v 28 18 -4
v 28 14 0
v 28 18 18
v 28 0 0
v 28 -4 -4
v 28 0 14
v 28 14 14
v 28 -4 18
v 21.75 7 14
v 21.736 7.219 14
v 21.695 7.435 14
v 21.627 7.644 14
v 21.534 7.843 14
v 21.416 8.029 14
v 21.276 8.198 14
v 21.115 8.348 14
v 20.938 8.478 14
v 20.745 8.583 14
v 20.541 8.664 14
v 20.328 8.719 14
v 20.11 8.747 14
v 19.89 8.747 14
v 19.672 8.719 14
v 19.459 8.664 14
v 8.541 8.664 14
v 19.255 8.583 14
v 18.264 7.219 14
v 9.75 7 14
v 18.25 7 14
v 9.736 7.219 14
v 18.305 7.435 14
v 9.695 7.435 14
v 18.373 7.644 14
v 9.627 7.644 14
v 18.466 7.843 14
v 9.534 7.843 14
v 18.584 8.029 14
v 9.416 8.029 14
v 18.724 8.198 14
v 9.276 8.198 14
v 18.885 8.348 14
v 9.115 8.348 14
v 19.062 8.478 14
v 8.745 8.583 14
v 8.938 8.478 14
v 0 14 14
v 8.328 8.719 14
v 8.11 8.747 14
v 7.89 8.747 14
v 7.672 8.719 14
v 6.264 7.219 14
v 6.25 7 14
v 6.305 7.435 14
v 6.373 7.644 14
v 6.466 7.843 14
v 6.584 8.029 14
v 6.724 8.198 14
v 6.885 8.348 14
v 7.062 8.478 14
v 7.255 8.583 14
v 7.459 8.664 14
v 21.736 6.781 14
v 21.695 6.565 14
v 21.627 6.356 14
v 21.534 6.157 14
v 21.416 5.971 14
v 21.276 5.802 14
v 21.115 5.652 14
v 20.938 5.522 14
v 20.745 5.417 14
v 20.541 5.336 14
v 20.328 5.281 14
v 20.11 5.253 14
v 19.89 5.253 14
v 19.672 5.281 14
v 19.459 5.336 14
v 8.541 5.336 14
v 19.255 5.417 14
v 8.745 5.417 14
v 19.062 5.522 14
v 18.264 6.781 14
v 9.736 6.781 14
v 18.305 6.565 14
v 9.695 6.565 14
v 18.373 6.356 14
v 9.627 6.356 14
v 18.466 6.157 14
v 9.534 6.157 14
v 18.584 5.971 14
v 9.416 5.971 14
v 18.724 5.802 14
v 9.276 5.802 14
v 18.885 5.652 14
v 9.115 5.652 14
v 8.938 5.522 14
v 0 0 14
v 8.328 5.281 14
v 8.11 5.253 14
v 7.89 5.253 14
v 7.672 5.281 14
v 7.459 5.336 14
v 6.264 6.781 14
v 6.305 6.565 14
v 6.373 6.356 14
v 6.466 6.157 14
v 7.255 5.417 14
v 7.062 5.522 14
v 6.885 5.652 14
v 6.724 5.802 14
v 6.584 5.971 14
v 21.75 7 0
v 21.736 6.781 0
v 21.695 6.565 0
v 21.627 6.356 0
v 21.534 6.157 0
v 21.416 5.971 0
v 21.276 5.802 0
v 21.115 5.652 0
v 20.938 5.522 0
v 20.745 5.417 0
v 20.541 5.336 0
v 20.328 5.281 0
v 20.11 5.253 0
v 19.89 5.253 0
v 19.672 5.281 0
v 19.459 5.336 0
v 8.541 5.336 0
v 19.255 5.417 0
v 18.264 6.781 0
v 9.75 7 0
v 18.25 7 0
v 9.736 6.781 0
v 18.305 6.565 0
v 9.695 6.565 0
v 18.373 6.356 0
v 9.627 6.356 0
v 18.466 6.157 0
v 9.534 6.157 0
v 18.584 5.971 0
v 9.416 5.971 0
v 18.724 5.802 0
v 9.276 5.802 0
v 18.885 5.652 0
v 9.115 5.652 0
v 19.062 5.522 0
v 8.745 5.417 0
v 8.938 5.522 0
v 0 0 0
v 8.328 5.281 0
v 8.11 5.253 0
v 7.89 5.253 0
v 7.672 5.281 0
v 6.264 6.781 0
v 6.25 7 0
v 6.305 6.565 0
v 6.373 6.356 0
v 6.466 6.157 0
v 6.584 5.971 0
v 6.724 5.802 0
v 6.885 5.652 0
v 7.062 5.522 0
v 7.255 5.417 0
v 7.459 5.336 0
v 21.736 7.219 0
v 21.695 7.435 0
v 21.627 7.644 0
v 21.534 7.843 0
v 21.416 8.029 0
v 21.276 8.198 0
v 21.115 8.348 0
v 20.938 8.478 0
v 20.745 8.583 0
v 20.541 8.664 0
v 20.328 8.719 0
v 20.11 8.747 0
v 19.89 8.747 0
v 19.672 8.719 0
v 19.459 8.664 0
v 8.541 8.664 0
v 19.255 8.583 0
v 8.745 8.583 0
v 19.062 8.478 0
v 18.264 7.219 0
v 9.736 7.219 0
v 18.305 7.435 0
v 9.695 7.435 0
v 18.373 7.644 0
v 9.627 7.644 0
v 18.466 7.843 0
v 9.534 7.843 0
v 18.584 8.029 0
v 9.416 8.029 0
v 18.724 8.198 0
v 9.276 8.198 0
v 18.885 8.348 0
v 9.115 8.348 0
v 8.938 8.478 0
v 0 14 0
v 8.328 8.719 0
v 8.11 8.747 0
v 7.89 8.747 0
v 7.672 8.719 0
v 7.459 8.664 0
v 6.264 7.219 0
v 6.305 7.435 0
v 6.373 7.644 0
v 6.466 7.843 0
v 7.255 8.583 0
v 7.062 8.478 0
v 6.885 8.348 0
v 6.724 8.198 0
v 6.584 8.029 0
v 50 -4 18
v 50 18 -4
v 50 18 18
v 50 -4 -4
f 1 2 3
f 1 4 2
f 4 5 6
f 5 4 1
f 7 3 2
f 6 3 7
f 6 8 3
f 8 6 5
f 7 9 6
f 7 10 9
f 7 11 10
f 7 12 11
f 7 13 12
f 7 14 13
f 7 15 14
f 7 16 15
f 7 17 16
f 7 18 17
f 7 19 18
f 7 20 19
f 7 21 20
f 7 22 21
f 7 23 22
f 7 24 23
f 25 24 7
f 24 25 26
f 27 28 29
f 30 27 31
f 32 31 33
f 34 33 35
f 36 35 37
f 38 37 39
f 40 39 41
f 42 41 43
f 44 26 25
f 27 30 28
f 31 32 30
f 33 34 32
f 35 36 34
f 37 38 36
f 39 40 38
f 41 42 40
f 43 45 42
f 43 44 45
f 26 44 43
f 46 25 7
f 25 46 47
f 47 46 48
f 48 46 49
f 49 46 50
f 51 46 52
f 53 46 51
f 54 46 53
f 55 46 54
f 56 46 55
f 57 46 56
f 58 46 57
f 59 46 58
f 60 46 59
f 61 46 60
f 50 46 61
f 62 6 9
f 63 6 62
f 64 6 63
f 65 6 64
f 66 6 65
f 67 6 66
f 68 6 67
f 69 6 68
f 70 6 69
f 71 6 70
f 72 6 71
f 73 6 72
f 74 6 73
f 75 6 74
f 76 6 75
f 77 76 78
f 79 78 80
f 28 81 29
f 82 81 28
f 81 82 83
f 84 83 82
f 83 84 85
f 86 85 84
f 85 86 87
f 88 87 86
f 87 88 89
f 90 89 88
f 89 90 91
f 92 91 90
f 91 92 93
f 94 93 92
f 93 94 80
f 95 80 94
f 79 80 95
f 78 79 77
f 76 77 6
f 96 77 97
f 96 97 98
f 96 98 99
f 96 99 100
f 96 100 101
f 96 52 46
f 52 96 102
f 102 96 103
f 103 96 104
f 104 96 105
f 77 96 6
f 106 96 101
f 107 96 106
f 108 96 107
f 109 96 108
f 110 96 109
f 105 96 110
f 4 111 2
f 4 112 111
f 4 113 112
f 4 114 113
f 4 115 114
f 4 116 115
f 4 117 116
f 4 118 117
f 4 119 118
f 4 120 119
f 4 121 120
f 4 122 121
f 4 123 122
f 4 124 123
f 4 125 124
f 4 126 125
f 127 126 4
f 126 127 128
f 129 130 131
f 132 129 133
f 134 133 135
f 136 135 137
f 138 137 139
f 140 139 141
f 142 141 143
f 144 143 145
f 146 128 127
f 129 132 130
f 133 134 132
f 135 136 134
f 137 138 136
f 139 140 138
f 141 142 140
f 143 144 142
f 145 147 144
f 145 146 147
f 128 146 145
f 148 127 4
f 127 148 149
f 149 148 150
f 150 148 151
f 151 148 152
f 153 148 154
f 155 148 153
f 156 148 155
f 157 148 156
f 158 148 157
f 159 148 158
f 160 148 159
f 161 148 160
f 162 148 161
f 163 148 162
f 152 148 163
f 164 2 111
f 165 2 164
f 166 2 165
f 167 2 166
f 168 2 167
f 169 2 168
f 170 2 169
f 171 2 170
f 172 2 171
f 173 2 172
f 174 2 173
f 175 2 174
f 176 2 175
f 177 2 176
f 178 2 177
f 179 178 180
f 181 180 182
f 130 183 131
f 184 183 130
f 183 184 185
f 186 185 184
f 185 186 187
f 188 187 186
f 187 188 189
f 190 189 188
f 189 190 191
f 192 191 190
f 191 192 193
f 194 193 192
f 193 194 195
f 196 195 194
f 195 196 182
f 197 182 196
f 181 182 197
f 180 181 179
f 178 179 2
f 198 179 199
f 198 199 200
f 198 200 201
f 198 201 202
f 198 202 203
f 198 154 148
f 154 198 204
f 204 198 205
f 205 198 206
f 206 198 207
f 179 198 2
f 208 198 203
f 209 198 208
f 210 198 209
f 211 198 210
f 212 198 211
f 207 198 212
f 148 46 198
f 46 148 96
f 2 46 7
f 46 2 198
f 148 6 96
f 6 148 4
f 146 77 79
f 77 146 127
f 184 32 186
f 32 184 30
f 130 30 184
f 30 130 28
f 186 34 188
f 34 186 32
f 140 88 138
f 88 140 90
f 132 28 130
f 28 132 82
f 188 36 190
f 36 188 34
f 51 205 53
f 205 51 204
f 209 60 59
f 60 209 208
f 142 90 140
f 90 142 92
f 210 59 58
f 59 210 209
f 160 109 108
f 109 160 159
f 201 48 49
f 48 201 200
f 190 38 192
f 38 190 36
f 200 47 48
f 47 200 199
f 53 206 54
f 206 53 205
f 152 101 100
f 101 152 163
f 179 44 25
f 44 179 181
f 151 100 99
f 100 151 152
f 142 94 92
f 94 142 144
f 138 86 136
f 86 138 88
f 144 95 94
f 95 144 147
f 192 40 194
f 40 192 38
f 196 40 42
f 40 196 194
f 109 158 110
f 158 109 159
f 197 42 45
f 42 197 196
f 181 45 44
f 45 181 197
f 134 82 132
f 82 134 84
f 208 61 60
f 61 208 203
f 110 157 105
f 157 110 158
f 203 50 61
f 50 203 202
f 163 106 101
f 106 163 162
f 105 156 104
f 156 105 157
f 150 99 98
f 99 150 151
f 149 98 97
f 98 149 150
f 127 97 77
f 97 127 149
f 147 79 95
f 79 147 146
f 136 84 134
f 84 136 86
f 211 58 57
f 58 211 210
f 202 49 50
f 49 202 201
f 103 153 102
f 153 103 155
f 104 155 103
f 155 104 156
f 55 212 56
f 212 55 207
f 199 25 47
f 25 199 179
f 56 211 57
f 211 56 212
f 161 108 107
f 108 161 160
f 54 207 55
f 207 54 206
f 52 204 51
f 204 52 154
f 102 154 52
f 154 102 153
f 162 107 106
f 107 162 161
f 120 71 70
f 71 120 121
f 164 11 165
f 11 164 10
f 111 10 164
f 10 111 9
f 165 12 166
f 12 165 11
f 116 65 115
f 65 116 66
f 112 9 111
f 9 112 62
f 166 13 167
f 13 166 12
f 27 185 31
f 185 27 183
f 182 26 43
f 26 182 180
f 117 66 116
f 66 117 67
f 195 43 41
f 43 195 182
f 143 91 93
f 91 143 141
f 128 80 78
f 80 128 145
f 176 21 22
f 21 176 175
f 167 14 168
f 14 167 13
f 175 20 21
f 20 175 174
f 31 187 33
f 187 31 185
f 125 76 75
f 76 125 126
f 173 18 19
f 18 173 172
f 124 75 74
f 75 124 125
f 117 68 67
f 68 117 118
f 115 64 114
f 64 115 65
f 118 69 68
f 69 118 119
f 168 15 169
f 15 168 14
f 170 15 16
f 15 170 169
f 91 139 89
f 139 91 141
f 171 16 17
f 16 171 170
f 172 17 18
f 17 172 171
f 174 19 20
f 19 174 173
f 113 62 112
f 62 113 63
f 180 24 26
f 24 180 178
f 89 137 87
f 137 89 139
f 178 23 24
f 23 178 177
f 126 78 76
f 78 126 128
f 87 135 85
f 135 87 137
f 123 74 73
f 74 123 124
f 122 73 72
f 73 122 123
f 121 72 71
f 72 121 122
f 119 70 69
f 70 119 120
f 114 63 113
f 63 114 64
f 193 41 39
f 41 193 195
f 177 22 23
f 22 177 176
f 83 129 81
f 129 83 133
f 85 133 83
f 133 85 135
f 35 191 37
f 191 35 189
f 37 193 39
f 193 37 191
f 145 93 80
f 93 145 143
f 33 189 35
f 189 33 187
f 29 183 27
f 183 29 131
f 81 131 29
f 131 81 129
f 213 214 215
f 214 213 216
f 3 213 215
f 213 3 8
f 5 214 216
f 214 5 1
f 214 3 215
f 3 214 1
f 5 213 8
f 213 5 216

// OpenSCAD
difference() {
    translate([0,0,0])
    cube([28,14,14]);
    
    
    translate([8,7,0]){
    cylinder(d=3.5, h=14, $fn=50);

    }
    
    translate([20,7,0]) {
        cylinder(d=3.5, h=14, $fn=50);
    }
}

translate([28,-4,-4])
cube([22,22,22]);
